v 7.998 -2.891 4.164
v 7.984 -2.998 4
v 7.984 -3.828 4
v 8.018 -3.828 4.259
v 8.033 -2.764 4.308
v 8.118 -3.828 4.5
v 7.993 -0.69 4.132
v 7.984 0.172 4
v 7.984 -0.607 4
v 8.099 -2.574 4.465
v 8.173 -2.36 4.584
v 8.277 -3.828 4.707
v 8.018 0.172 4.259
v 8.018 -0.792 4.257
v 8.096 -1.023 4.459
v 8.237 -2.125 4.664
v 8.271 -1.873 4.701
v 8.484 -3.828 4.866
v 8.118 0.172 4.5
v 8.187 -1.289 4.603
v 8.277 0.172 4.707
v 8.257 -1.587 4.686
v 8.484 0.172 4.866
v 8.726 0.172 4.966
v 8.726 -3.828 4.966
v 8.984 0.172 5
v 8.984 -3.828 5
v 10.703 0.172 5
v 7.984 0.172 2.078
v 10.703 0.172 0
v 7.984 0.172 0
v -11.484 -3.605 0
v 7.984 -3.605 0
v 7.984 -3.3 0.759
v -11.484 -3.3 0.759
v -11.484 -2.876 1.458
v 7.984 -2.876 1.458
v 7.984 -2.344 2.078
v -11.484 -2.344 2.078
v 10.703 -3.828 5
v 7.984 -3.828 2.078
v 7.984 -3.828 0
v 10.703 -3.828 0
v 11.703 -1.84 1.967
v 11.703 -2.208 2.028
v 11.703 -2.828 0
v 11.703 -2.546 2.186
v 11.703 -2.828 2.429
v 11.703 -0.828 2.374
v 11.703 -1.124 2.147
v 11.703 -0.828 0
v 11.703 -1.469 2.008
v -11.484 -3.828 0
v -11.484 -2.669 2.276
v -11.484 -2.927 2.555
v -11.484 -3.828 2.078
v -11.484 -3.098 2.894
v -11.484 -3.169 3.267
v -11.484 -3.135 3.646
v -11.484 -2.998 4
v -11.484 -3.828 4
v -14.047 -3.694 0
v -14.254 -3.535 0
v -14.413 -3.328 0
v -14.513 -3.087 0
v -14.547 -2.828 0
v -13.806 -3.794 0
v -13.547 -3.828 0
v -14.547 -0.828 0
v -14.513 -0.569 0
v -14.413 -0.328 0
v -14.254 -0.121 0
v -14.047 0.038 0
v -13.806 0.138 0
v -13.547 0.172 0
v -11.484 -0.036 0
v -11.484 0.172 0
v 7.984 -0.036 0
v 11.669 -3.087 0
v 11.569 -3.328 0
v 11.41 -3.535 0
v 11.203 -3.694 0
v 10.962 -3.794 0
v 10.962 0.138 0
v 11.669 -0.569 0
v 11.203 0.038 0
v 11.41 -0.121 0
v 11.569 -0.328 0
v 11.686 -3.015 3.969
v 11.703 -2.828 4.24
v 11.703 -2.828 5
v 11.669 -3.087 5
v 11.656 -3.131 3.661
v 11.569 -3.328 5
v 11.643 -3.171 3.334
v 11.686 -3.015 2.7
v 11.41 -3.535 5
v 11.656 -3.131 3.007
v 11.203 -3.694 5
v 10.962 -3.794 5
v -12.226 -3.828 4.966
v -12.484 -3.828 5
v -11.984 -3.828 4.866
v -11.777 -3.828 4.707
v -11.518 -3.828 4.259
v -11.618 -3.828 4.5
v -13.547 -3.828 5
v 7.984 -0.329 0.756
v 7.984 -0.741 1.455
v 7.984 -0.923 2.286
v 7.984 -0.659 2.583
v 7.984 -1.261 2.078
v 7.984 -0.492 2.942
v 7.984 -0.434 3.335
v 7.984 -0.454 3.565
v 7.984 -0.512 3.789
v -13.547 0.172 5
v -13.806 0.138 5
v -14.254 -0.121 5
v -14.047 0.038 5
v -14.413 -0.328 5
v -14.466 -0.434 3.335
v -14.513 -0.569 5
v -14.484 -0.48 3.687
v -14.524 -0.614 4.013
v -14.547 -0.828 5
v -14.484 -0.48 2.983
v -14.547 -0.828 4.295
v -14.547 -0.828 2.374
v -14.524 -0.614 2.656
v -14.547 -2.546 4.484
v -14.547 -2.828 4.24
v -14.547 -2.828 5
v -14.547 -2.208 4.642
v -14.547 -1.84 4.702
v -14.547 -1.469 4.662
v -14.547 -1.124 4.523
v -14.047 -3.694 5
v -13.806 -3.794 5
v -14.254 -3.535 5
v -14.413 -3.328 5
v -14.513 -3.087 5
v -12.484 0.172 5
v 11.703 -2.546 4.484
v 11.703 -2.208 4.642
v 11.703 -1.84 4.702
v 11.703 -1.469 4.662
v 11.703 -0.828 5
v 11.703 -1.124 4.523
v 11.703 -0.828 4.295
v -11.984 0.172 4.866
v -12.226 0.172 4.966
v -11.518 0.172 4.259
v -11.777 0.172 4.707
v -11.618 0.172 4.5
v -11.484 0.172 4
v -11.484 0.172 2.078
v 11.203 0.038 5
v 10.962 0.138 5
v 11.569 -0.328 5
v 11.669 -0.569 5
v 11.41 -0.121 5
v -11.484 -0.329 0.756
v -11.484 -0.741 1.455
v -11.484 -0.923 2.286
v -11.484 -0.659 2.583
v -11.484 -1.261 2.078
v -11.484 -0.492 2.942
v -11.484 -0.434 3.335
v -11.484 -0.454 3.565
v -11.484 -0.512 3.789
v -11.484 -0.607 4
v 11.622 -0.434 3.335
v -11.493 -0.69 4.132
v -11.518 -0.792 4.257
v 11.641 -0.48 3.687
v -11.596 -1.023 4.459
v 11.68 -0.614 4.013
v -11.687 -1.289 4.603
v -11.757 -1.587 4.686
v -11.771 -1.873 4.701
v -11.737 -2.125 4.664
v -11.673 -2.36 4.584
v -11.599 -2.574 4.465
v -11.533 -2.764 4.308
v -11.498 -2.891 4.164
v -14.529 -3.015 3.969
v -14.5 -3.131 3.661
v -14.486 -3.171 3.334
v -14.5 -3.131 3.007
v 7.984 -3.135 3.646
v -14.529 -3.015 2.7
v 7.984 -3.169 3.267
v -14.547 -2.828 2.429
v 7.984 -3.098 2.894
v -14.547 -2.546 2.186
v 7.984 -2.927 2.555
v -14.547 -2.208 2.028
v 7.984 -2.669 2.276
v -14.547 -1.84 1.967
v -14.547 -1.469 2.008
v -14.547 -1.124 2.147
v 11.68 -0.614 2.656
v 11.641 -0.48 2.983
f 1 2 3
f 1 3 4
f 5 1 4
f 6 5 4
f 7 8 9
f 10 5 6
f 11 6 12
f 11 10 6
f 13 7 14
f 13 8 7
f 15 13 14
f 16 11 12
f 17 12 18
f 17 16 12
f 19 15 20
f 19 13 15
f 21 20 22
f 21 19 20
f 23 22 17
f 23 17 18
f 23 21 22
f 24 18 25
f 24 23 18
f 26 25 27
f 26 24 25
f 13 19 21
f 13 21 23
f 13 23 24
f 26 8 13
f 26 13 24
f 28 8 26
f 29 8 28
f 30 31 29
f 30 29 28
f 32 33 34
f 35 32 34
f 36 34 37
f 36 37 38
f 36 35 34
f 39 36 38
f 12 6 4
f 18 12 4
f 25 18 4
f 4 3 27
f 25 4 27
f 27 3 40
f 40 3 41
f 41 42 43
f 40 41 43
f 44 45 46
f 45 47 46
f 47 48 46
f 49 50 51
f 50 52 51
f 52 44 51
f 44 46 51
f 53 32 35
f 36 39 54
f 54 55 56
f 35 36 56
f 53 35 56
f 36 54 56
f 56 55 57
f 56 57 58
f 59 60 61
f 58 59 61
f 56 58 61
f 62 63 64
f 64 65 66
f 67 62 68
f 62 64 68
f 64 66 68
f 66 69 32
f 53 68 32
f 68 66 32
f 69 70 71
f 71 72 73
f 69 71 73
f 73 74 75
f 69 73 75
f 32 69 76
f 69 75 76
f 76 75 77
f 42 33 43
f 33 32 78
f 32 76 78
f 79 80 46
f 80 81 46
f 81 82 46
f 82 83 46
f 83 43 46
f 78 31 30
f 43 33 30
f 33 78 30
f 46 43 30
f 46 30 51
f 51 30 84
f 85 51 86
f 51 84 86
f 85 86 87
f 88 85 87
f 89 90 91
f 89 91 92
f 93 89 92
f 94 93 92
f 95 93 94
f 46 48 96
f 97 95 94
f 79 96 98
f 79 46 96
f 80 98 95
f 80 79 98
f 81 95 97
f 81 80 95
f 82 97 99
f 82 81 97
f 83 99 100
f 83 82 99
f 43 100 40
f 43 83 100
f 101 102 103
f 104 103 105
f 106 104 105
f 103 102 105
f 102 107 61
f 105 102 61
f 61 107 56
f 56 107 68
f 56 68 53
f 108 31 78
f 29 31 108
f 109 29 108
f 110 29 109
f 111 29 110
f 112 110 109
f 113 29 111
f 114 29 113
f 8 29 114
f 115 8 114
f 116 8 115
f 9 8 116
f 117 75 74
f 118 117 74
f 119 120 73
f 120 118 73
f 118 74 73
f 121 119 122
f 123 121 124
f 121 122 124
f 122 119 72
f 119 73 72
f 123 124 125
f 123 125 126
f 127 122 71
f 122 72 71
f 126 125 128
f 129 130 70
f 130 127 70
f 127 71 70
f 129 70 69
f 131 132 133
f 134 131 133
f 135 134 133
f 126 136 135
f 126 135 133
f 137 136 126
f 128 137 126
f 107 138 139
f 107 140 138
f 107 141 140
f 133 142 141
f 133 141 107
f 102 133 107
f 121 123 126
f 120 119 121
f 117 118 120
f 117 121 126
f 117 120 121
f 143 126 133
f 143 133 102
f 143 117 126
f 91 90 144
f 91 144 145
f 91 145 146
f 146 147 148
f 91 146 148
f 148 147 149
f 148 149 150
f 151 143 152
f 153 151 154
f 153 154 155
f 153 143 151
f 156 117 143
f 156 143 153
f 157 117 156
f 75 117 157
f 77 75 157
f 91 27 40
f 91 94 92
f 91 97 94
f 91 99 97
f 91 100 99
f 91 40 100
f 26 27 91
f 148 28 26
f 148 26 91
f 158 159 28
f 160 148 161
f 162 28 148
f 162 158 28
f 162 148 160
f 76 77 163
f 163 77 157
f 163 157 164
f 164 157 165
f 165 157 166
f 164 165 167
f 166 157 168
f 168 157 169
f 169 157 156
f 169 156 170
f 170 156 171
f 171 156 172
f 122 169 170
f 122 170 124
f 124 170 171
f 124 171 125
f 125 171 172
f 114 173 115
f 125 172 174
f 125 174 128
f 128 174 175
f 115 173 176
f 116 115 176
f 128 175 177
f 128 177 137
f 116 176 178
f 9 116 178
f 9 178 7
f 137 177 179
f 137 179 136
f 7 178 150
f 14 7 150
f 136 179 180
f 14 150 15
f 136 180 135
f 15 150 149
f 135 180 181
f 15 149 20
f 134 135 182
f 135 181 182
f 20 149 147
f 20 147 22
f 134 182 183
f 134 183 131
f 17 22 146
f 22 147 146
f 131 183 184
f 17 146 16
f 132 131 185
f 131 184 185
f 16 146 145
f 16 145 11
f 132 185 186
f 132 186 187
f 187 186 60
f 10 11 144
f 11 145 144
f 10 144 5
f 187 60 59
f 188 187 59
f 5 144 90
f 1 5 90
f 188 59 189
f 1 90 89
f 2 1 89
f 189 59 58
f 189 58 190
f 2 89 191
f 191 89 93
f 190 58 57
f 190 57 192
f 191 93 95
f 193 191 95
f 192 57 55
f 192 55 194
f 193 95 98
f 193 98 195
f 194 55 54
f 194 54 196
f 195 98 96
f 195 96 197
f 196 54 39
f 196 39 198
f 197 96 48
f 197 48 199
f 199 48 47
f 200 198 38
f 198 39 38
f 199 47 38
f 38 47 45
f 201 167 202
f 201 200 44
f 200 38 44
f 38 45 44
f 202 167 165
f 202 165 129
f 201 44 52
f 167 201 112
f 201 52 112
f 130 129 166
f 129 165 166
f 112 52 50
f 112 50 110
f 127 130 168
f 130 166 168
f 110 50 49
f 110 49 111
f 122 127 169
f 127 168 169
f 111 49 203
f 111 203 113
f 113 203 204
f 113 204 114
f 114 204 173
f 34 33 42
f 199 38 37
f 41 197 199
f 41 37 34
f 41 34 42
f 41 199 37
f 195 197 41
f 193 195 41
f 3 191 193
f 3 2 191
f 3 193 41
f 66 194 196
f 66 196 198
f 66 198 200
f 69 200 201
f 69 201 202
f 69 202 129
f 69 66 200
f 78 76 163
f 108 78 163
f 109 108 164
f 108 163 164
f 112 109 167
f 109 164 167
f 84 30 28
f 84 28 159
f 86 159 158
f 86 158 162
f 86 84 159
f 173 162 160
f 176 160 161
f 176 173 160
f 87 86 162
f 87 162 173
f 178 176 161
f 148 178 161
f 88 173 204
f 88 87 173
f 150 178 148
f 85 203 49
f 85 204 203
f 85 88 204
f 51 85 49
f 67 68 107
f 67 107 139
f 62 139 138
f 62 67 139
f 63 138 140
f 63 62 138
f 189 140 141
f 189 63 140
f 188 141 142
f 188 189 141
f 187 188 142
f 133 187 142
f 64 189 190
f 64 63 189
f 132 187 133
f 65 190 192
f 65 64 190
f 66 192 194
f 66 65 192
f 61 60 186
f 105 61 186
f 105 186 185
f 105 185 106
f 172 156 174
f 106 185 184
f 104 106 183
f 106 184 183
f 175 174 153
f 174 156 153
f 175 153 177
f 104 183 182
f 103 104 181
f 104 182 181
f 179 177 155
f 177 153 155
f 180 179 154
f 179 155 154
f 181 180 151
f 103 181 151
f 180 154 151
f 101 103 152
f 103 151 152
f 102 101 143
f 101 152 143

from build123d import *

# Parameters (mm, degrees)
F0_W         = 26.2500010431
F0_H         = 4
F1_DEPTH     = 5
F2_W         = 19.4687498733
F2_H         = 4.5937502291
F3_DEPTH     = 43.3
F4_DEPTH     = 52.6
F5_R         = 1.3682808459
F6_DEPTH     = 25
F7_DEPTH     = 21.1
F8_T1_DEPTH  = 10
F9_T1_DEPTH  = 10
F10_T1_DEPTH = 10
F11_T1_DEPTH = 19.4687498733
F12_T1_DEPTH = 9


# Not quite as in the source:
# - a fillet or chamfer that OpenCascade refuses, or shapes differently, is made with other operations: its cross-section is extruded or revolved along the edge and cut away or added


with BuildPart() as f1:
    # F0 (on Top) → F1 (new body)
    with BuildSketch(Plane.XY):
        with Locations((-1.4218753204, -1.8281253073)):
            Rectangle(F0_W, F0_H)
    extrude(amount=F1_DEPTH)

    # F2 (on Front) → F3 (cut)
    with BuildSketch(Plane.XZ):
        with Locations((-1.7500002868, 4.375000135)):
            Rectangle(F2_W, F2_H)
    extrude(amount=F3_DEPTH, mode=Mode.SUBTRACT)

    # F2 (on Front) → F4 (cut)
    with BuildSketch(Plane.XZ):
        with Locations((-1.7500002868, 4.375000135)):
            Rectangle(F2_W, F2_H)
    extrude(amount=-F4_DEPTH, mode=Mode.SUBTRACT)

    # F5 (on Right) → F6 (cut)
    with BuildSketch(Plane.YZ):
        with Locations((-1.802527695, 3.3346994314)):
            Circle(F5_R)
    extrude(amount=-F6_DEPTH, mode=Mode.SUBTRACT)

    # F5 (on Right) → F7 (cut)
    with BuildSketch(Plane.YZ):
        with Locations((-1.802527695, 3.3346994314)):
            Circle(F5_R)
    extrude(amount=F7_DEPTH, mode=Mode.SUBTRACT)

    # F8: fillet of radius 1 on 1 edges, made by hand

    # F8_s2 → F8_t1 (cut)
    with BuildSketch(Plane.XY.offset(-2.5)):
        with BuildLine():
            ThreePointArc((10.7031252012, 0.1718746927), (11.4102319824, -0.1210185261), (11.7031252012, -0.8281253073))
            Line((11.7031252012, -0.8281253073), (11.7031252012, 0.1718746927))
            Line((11.7031252012, 0.1718746927), (10.7031252012, 0.1718746927))
        make_face()
    extrude(amount=F8_T1_DEPTH, mode=Mode.SUBTRACT)

    # F9: fillet of radius 1 on 1 edges, made by hand

    # F9_s2 → F9_t1 (cut)
    with BuildSketch(Plane.XY.offset(-2.5)):
        with BuildLine():
            ThreePointArc((-13.5468758419, 0.1718746927), (-14.2539826231, -0.1210185261), (-14.5468758419, -0.8281253073))
            Line((-14.5468758419, -0.8281253073), (-14.5468758419, 0.1718746927))
            Line((-14.5468758419, 0.1718746927), (-13.5468758419, 0.1718746927))
        make_face()
    extrude(amount=F9_T1_DEPTH, mode=Mode.SUBTRACT)

    # F10: fillet of radius 1 on 2 edges, made by hand

    # F10_s2 → F10_t1 (cut)
    with BuildSketch(Plane.XY.offset(-2.5)):
        with BuildLine():
            ThreePointArc((11.7031252012, -2.8281253073), (11.4102319824, -3.5352320885), (10.7031252012, -3.8281253073))
            Line((10.7031252012, -3.8281253073), (11.7031252012, -3.8281253073))
            Line((11.7031252012, -3.8281253073), (11.7031252012, -2.8281253073))
        make_face()
        with BuildLine():
            ThreePointArc((-13.5468758419, -3.8281253073), (-14.2539826231, -3.5352320885), (-14.5468758419, -2.8281253073))
            Line((-14.5468758419, -2.8281253073), (-14.5468758419, -3.8281253073))
            Line((-14.5468758419, -3.8281253073), (-13.5468758419, -3.8281253073))
        make_face()
    extrude(amount=F10_T1_DEPTH, mode=Mode.SUBTRACT)

    # F11: fillet of radius 5 on 2 edges, made by hand

    # F11_s2 → F11_t1 (cut)
    with BuildSketch(Plane.YZ.offset(-11.4843752235)):
        with BuildLine():
            ThreePointArc((0.1718746927, -1.4255693283), (-0.2001967002, 0.467121034), (-1.2610360303, 2.0781250205))
            Line((-1.2610360303, 2.0781250205), (0.1718746927, 2.0781250205))
            Line((0.1718746927, 2.0781250205), (0.1718746927, -1.4255693283))
        make_face()
        with BuildLine():
            ThreePointArc((-3.8281253073, -1.4769402409), (-3.4422054032, 0.4492645429), (-2.3440193596, 2.0781250205))
            Line((-2.3440193596, 2.0781250205), (-3.8281253073, 2.0781250205))
            Line((-3.8281253073, 2.0781250205), (-3.8281253073, -1.4769402409))
        make_face()
    extrude(amount=F11_T1_DEPTH, mode=Mode.SUBTRACT)

    # F12: fillet of radius 1 on 2 edges, made by hand

    # F12_s2 → F12_t1 (cut)
    with BuildSketch(Plane.XZ.offset(-2.6718746927)):
        with BuildLine():
            ThreePointArc((7.9843746498, 4), (8.2772678686, 4.7071067812), (8.9843746498, 5))
            Line((8.9843746498, 5), (7.9843746498, 5))
            Line((7.9843746498, 5), (7.9843746498, 4))
        make_face()
        with BuildLine():
            ThreePointArc((-11.4843752235, 4), (-11.7772684423, 4.7071067812), (-12.4843752235, 5))
            Line((-12.4843752235, 5), (-11.4843752235, 5))
            Line((-11.4843752235, 5), (-11.4843752235, 4))
        make_face()
    extrude(amount=F12_T1_DEPTH, mode=Mode.SUBTRACT)


solid = f1.part
